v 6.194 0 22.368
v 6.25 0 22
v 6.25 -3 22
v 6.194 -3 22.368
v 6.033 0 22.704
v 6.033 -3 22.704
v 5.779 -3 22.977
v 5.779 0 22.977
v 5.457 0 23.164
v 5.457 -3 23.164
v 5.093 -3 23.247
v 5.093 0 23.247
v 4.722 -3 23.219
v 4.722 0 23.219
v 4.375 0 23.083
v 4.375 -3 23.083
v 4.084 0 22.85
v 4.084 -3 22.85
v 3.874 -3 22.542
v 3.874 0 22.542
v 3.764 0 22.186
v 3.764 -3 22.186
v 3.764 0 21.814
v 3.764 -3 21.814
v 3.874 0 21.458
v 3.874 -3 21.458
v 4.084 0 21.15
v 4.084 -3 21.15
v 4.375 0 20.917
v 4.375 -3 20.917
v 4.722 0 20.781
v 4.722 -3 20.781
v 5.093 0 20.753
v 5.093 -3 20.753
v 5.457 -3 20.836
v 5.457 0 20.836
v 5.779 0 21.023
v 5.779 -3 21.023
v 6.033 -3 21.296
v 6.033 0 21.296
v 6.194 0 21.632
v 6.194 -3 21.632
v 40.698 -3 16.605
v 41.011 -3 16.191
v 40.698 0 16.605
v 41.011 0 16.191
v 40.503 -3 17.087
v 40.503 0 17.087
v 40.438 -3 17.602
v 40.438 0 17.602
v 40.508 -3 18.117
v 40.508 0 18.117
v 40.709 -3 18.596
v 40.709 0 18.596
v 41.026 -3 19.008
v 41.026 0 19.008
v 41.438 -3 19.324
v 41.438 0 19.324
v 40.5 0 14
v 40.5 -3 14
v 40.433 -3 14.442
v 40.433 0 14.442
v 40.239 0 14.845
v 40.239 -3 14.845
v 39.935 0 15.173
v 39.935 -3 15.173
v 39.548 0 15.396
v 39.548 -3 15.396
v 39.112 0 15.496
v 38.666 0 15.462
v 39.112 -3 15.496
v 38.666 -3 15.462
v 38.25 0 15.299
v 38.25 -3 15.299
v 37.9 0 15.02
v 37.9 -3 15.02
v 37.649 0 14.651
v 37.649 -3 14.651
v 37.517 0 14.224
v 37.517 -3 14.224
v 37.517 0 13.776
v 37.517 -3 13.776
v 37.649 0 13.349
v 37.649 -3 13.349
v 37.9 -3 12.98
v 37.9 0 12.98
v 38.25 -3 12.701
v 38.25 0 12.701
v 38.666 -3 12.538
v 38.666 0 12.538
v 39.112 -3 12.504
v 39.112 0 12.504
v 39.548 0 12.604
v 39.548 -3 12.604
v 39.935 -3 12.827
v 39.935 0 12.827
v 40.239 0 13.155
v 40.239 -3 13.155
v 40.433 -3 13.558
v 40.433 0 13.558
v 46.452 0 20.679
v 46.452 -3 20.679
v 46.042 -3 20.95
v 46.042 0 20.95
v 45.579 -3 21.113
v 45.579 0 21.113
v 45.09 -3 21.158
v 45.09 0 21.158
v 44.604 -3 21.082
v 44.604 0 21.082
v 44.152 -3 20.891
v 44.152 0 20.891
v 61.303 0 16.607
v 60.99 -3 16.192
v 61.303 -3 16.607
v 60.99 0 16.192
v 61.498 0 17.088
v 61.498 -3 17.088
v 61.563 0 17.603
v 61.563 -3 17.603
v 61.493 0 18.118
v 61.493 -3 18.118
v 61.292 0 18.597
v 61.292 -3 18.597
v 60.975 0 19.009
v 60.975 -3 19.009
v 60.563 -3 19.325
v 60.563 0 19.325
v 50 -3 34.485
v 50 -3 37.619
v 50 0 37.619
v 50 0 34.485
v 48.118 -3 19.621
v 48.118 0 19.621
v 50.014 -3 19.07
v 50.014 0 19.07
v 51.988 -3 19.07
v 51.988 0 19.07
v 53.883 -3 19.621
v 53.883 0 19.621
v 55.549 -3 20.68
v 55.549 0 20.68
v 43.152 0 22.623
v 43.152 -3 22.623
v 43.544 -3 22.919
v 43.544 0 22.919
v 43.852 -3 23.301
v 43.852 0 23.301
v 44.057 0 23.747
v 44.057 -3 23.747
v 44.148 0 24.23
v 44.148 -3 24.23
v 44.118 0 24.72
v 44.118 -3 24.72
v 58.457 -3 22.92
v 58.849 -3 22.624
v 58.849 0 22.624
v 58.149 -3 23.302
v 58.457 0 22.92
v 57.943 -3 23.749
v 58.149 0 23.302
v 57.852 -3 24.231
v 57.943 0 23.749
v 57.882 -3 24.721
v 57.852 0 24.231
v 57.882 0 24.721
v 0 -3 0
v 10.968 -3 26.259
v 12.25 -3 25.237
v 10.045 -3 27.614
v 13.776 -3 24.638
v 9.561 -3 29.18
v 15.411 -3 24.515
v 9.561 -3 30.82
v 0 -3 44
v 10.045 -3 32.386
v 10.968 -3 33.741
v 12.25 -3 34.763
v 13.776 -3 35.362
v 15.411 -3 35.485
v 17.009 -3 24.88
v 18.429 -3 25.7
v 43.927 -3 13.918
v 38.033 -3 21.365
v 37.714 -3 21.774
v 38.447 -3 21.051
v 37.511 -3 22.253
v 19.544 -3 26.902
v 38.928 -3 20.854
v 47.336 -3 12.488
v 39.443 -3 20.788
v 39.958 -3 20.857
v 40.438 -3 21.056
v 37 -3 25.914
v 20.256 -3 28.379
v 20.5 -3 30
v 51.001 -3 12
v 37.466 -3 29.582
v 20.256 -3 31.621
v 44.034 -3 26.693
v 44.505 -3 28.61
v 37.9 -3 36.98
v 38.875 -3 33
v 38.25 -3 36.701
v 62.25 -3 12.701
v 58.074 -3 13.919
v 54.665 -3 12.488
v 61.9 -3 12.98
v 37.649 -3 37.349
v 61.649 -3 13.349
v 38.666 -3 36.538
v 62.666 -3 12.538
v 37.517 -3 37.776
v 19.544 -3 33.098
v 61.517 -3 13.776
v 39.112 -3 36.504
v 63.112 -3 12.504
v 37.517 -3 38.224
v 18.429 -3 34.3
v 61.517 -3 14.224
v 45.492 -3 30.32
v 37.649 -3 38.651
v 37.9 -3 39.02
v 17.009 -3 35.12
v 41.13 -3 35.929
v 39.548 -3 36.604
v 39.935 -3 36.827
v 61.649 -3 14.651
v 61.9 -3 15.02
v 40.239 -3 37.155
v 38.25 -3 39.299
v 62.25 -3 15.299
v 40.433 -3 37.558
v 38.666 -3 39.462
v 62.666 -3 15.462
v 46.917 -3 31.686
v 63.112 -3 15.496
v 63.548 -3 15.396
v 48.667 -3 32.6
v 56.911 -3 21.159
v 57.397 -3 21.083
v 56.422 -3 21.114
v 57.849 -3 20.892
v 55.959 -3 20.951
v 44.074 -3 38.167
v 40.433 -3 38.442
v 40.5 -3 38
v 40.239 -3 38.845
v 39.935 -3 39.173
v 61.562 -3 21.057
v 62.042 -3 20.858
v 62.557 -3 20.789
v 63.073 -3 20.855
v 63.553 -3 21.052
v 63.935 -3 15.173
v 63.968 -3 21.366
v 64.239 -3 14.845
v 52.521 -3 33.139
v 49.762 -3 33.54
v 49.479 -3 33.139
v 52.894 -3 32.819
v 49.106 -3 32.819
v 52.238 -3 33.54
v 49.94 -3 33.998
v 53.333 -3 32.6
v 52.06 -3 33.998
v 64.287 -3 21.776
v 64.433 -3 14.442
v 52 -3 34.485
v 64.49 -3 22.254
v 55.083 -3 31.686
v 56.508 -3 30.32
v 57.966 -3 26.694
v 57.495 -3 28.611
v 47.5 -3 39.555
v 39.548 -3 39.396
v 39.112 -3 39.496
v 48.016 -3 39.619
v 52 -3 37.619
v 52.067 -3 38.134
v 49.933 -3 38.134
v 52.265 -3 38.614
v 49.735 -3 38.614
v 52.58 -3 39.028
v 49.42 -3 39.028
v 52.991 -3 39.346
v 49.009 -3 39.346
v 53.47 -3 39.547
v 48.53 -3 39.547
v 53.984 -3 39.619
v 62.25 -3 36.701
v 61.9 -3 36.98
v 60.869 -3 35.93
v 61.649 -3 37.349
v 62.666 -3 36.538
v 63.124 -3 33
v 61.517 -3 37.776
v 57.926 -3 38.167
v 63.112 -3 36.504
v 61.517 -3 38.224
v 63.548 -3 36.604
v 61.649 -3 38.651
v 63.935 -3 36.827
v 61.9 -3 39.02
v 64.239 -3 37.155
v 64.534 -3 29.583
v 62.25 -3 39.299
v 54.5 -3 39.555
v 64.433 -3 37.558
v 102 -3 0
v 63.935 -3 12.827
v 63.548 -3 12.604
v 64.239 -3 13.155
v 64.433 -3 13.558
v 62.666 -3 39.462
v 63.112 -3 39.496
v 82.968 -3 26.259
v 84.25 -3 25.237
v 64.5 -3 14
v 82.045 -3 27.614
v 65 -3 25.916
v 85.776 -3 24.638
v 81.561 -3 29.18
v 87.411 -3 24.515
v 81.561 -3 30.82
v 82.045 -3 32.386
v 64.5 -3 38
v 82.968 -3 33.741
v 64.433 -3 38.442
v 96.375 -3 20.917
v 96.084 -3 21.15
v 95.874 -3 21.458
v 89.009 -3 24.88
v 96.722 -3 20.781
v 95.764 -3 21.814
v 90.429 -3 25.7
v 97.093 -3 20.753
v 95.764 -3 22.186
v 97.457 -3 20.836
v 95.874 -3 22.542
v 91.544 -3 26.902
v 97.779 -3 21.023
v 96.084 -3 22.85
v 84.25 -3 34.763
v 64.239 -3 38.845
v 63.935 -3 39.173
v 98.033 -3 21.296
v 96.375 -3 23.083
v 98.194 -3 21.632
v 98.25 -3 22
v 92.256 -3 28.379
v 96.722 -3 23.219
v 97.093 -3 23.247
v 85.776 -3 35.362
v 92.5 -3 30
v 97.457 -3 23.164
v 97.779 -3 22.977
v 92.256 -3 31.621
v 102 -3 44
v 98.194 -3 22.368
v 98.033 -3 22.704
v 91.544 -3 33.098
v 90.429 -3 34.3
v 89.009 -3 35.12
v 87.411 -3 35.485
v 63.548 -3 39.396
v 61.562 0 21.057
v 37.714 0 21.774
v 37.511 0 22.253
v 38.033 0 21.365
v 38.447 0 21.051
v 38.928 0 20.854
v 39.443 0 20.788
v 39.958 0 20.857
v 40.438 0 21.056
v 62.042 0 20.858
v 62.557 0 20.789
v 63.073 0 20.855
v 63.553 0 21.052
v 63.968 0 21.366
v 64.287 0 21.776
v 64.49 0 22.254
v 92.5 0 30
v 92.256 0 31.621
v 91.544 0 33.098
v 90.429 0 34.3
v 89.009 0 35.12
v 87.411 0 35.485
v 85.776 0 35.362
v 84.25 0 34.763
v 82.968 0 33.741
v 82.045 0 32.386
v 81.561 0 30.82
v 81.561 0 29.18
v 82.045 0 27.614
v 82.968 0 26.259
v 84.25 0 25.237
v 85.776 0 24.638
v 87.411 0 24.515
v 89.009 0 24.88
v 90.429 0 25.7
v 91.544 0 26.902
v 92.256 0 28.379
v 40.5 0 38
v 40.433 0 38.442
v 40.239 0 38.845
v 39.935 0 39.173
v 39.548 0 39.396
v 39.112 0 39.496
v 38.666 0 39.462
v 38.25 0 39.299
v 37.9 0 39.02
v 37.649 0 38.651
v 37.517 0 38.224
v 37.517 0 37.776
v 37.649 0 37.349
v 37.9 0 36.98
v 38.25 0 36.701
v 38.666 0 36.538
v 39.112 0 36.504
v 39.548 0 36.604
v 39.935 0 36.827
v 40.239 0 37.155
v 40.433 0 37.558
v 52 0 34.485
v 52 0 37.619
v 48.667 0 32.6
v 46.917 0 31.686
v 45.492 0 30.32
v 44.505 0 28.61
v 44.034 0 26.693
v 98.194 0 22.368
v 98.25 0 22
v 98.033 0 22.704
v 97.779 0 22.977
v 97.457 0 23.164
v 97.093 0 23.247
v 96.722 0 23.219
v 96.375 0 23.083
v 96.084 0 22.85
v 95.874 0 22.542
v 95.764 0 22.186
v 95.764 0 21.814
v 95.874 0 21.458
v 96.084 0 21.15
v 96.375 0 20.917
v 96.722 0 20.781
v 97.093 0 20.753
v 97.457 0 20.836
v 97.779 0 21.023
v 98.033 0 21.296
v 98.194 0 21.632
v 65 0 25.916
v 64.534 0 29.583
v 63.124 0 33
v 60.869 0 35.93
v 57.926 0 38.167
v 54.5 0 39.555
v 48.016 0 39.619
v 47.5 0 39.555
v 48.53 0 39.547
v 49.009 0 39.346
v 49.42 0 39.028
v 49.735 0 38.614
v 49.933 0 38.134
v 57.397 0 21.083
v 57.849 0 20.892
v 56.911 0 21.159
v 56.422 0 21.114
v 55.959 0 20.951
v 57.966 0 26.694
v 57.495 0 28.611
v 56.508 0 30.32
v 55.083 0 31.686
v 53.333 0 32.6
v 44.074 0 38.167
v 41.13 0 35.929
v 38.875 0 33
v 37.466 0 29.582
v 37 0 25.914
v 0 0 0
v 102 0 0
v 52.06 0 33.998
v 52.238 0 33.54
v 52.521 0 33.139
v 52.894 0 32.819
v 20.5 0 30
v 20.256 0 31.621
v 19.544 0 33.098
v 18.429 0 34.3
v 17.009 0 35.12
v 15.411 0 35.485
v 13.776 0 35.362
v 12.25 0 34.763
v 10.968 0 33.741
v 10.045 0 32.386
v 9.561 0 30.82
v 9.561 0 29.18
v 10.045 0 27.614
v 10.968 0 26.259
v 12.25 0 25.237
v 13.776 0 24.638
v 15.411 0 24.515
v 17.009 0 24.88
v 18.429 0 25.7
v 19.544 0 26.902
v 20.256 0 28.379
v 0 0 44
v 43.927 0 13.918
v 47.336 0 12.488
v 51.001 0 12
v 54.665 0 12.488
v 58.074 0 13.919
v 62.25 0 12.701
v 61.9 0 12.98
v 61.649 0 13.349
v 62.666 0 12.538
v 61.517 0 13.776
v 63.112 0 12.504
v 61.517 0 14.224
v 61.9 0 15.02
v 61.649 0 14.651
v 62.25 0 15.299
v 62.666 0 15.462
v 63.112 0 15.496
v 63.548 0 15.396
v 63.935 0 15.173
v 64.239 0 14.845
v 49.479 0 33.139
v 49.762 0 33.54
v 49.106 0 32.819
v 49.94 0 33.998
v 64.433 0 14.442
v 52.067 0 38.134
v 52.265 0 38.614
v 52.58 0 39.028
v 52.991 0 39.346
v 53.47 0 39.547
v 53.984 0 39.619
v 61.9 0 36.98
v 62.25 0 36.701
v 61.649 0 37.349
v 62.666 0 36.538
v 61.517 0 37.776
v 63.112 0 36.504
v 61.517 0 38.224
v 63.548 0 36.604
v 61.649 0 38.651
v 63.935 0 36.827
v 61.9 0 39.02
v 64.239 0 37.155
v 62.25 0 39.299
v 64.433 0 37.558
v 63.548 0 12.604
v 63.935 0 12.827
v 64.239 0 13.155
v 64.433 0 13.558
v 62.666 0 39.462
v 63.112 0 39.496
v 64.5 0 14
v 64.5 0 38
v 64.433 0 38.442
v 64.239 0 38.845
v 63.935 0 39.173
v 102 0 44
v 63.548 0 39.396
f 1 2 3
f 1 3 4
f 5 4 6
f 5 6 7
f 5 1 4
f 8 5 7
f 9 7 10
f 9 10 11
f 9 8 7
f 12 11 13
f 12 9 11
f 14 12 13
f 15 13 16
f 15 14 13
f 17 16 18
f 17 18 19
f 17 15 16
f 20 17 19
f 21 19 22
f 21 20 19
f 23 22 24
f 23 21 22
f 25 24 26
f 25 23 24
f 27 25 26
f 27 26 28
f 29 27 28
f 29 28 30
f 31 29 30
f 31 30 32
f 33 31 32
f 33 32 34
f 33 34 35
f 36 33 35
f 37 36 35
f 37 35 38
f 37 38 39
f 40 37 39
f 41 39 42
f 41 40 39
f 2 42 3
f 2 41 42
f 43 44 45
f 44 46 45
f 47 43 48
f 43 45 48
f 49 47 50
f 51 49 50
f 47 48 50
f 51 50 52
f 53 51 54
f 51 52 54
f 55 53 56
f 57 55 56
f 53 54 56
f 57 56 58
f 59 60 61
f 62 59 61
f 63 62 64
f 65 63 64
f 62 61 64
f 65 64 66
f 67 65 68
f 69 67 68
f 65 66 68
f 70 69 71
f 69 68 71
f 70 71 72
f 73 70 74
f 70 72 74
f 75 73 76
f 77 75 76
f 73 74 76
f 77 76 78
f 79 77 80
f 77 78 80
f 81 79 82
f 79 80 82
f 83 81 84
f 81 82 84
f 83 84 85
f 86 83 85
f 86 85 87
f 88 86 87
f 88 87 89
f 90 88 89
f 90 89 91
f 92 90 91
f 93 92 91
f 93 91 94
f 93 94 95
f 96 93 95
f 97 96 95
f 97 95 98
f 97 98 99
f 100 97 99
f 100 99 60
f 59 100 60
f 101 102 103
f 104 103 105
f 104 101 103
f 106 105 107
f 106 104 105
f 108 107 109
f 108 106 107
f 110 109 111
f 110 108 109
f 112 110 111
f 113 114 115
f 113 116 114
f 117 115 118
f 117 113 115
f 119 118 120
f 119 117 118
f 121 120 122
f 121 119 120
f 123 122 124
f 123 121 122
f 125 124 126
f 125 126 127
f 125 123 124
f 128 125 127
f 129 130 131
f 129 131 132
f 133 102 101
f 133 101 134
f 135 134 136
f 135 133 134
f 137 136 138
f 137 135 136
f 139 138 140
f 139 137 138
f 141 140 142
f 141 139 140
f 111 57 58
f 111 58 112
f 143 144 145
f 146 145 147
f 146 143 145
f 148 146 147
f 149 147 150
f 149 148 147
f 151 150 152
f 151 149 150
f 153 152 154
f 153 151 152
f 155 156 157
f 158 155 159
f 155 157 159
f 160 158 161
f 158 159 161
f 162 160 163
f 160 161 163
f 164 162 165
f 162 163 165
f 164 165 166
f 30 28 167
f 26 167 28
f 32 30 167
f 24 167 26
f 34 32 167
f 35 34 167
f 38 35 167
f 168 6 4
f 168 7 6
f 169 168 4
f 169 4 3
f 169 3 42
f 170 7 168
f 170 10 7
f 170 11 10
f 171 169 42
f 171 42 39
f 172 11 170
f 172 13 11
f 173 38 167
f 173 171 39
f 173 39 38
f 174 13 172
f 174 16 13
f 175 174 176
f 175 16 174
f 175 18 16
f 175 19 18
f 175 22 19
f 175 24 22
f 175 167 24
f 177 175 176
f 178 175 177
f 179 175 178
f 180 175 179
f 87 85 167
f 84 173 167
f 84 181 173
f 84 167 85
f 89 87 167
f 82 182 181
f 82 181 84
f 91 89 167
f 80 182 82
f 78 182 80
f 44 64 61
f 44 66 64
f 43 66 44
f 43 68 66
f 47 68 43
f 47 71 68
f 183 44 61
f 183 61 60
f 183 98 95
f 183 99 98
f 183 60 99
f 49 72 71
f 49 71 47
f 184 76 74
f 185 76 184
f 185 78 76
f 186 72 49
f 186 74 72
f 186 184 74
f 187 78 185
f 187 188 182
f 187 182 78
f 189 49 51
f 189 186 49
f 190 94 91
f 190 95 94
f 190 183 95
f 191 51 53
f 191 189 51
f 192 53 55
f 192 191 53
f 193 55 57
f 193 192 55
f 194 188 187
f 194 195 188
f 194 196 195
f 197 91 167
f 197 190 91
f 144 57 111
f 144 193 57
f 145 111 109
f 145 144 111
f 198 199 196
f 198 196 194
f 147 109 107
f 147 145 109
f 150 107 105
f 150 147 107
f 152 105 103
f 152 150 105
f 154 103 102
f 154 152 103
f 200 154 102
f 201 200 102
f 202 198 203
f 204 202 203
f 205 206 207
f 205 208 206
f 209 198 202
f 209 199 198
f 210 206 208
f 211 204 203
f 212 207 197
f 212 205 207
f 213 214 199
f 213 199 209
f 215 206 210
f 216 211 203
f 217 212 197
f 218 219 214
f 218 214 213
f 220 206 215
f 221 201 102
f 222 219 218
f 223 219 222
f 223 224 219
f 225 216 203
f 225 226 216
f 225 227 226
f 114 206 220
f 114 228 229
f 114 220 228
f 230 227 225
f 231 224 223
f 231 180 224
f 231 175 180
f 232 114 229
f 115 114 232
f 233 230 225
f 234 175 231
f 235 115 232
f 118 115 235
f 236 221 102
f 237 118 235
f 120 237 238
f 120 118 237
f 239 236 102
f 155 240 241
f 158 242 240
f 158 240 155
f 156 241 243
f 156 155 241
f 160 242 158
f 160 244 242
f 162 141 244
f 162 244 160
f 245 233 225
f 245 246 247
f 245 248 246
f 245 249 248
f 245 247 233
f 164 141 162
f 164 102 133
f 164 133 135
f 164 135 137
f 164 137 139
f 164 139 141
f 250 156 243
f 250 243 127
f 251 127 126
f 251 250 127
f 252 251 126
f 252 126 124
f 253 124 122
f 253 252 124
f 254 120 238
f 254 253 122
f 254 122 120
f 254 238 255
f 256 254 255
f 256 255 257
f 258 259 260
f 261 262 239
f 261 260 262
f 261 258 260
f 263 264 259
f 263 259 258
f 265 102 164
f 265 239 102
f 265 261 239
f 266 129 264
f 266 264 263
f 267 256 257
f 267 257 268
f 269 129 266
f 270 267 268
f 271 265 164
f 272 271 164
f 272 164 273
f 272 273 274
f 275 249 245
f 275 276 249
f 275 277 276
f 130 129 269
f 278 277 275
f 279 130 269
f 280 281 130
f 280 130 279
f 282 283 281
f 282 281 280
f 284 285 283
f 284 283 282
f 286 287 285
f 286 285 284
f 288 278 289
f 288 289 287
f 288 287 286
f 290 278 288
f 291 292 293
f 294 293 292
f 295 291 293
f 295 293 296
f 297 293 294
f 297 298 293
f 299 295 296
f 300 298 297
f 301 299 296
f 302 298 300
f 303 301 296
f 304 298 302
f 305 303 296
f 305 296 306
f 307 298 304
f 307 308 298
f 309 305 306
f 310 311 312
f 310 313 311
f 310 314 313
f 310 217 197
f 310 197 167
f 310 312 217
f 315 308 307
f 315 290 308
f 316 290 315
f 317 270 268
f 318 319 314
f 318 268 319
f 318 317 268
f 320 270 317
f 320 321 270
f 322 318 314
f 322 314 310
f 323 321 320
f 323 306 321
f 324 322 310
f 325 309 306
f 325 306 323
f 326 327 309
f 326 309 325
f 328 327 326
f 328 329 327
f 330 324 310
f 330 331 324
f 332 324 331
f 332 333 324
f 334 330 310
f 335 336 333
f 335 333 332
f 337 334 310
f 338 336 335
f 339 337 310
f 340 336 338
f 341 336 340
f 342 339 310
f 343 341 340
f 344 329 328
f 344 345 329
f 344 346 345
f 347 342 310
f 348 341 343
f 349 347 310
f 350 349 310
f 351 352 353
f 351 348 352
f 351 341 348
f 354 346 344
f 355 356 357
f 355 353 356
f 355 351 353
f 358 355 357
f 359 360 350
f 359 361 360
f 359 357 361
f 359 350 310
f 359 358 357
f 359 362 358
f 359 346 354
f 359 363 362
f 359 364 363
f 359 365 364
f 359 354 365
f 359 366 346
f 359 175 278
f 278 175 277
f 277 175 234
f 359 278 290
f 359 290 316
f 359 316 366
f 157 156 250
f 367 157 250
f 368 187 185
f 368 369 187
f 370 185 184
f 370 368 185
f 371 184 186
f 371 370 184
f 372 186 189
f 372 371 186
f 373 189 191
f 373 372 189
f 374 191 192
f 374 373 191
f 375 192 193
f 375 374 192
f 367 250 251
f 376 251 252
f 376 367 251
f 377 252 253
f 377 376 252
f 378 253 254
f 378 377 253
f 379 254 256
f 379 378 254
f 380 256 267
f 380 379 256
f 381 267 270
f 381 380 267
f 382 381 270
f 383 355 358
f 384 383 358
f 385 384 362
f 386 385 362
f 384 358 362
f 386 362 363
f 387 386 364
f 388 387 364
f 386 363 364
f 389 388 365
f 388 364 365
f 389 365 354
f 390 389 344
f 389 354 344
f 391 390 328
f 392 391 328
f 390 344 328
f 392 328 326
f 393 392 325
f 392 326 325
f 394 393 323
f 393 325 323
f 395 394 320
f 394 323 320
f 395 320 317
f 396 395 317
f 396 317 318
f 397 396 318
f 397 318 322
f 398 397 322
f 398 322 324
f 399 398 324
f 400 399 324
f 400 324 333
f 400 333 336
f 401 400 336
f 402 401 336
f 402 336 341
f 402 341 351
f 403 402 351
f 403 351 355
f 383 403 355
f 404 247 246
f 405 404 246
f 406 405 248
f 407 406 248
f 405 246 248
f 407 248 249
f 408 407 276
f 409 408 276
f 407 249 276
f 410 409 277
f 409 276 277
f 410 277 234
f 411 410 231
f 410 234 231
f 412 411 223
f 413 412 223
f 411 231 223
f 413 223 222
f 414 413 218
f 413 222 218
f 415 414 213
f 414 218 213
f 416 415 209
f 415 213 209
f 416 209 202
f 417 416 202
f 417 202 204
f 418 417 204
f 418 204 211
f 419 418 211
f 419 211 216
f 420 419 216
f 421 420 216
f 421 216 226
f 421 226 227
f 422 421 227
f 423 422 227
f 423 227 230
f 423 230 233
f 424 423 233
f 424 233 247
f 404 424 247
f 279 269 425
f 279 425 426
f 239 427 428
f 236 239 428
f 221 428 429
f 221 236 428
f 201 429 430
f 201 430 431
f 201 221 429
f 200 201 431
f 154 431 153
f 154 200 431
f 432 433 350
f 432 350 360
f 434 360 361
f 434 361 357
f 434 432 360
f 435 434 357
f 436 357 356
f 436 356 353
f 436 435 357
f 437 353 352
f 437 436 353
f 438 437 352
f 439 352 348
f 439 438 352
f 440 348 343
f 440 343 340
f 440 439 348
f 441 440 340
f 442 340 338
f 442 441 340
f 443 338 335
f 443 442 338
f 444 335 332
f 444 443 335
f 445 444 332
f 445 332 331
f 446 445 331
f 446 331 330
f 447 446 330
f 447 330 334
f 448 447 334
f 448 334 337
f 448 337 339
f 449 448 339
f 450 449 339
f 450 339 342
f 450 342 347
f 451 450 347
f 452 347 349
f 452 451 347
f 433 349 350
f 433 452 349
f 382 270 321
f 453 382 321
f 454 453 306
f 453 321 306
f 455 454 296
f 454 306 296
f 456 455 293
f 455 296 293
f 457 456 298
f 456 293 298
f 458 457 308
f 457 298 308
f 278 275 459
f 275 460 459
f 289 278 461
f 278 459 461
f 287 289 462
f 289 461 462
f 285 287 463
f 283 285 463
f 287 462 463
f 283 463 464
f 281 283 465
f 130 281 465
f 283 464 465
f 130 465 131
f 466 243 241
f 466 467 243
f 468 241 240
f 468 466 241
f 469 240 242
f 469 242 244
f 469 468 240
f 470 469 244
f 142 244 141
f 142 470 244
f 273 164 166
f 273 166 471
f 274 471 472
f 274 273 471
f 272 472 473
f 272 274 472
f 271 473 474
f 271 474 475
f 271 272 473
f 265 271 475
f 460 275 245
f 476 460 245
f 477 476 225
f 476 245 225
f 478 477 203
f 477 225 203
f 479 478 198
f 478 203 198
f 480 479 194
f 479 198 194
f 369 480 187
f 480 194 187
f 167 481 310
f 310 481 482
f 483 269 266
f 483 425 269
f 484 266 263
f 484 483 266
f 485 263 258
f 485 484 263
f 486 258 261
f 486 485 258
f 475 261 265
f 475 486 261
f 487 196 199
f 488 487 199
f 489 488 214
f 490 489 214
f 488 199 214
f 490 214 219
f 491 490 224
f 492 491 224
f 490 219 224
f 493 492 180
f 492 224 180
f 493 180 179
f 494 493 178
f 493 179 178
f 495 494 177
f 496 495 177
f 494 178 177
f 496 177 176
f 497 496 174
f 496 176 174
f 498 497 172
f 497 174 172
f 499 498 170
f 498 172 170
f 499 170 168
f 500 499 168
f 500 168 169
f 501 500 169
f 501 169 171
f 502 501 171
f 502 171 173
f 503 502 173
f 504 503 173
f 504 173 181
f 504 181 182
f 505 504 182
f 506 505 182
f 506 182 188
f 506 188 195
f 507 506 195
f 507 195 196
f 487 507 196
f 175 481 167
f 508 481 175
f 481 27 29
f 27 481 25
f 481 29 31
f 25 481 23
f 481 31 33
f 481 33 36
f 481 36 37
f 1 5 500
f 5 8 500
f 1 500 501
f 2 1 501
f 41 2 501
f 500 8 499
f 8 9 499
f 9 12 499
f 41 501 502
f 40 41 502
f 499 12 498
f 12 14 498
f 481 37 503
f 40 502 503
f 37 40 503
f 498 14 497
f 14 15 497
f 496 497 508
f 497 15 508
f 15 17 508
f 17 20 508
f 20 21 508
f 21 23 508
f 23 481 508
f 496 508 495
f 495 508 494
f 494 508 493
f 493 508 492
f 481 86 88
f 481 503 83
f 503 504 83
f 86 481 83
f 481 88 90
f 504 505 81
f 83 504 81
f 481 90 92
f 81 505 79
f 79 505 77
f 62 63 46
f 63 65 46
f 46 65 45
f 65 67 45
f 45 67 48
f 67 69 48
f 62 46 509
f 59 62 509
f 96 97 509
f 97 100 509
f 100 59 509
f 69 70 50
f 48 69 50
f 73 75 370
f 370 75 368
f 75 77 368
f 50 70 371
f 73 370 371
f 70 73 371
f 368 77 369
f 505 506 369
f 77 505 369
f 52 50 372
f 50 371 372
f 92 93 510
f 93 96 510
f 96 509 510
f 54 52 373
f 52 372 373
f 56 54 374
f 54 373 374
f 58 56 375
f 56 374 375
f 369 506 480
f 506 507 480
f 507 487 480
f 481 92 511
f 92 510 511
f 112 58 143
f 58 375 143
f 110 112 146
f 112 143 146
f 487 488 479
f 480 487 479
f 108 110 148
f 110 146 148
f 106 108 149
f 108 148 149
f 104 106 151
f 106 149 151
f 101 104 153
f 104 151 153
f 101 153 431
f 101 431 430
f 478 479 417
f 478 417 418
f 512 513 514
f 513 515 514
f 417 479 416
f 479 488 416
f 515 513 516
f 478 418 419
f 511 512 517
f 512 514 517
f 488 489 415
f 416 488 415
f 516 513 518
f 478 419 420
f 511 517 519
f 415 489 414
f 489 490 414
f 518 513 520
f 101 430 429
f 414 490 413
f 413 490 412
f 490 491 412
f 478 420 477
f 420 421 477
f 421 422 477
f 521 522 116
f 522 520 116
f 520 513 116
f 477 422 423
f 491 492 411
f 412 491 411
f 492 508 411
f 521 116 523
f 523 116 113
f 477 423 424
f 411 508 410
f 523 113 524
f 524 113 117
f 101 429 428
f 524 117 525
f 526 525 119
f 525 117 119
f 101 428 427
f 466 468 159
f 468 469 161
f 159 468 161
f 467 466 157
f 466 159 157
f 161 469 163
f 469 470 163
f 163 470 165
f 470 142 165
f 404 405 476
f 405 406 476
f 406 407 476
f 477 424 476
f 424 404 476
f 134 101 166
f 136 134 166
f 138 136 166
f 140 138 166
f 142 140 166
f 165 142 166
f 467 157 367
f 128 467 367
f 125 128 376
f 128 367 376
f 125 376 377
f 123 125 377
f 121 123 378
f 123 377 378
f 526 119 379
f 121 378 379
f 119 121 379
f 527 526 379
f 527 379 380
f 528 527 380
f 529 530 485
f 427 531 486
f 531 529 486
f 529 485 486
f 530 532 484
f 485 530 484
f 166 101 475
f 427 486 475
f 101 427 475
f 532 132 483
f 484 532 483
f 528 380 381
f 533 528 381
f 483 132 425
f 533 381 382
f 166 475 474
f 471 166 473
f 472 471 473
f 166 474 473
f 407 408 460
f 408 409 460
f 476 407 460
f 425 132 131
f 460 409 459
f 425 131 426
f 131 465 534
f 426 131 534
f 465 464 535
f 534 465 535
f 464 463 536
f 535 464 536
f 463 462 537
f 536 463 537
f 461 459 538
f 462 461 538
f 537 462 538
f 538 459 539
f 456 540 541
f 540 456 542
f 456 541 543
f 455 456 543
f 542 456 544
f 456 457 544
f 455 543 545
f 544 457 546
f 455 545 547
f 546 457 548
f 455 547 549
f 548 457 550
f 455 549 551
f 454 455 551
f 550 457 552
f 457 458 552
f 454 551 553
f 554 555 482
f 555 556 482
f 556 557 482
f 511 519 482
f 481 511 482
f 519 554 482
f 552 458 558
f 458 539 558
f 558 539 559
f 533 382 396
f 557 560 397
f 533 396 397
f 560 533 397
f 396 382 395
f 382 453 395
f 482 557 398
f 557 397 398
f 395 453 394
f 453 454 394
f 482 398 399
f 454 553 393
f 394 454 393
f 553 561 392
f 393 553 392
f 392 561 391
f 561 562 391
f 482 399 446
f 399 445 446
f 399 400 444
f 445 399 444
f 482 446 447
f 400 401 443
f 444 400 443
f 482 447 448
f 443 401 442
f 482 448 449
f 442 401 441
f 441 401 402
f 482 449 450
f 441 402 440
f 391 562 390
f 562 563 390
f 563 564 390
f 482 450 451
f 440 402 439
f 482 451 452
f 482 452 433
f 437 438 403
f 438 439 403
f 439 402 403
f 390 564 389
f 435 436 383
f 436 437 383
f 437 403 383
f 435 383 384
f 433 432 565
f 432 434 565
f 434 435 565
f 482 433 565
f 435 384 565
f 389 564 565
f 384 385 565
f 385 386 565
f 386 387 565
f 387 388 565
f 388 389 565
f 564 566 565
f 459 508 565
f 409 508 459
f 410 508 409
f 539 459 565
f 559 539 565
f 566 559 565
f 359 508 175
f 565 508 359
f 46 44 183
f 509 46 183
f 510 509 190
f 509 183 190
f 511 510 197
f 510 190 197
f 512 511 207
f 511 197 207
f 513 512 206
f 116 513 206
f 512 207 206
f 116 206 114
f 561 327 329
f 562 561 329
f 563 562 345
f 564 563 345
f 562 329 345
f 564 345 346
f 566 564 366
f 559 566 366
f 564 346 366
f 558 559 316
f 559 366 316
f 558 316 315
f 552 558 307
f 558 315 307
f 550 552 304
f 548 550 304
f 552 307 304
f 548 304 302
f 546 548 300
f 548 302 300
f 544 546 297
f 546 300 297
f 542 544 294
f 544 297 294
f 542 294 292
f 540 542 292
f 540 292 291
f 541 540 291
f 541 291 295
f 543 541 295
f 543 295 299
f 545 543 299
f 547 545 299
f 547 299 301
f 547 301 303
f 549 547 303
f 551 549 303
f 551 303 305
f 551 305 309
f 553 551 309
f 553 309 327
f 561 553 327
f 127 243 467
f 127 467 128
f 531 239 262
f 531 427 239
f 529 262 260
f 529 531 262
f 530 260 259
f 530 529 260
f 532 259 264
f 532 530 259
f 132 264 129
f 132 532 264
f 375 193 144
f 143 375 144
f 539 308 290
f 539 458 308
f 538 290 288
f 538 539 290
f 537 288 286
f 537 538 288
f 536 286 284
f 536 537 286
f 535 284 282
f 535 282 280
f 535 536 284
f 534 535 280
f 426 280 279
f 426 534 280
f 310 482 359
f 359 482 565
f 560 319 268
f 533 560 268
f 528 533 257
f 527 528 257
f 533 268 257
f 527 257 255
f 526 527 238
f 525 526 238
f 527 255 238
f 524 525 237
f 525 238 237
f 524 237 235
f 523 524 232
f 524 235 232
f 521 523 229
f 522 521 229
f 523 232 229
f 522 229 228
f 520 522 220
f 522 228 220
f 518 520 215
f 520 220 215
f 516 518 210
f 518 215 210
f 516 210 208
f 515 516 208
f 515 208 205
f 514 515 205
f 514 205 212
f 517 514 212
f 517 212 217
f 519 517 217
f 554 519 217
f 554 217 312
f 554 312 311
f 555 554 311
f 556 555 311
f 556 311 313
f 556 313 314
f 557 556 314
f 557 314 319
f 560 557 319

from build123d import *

# Parameters (mm, degrees)
SKETCH_W        = 102
SKETCH_H        = 44
SKETCH_R        = 1.25
PAD_DEPTH       = 3
SKETCH001_R     = 5.5
POCKET_DEPTH    = 3.001
SKETCH002_R     = 1.5
POCKET001_DEPTH = 3.001
POCKET002_DEPTH = 3.001
FILLET_R        = 2


with BuildPart() as part:
    # Sketch → Pad (new body)
    with BuildSketch(Plane.XZ):
        with Locations((51, 22)):
            Rectangle(SKETCH_W, SKETCH_H)
        with Locations((5, 22)):
            Circle(SKETCH_R, mode=Mode.SUBTRACT)
        with Locations((97, 22)):
            Circle(SKETCH_R, mode=Mode.SUBTRACT)
    extrude(amount=PAD_DEPTH)

    # Sketch001 (on Face8 of Pad) → Pocket (cut, through all)
    with BuildSketch(Plane.XZ.offset(3)):
        with Locations((15, 30)):
            Circle(SKETCH001_R)
        with Locations((87, 30)):
            Circle(SKETCH001_R)
    extrude(amount=-POCKET_DEPTH, mode=Mode.SUBTRACT)

    # Sketch002 (on Face5 of Pocket) → Pocket001 (cut, through all)
    with BuildSketch(Plane.XZ.offset(3)):
        with Locations((39, 38)):
            Circle(SKETCH002_R)
        with Locations((63, 38)):
            Circle(SKETCH002_R)
        with Locations((39, 14)):
            Circle(SKETCH002_R)
        with Locations((63, 14)):
            Circle(SKETCH002_R)
    extrude(amount=-POCKET001_DEPTH, mode=Mode.SUBTRACT)

    # Sketch003 (on Face5 of Pocket001) → Pocket002 (cut, through all)
    with BuildSketch(Plane.XZ.offset(3)):
        with BuildLine():
            Line((50, 39.96424), (50, 32.928203))
            ThreePointArc((50, 32.928203), (44.937661, 29.499721), (44.500239, 23.401325))
            Line((38.406893, 19.88333), (44.500239, 23.401325))
            ThreePointArc((50, 39.96424), (38.875484, 32.999723), (38.406893, 19.88333))
        make_face()
        with BuildLine():
            Line((39.406972, 18.151325), (45.500399, 21.669367))
            ThreePointArc((45.500399, 21.669367), (51.000645, 19), (56.500399, 21.670379))
            Line((56.500399, 21.670379), (62.593745, 18.152384))
            ThreePointArc((39.406972, 18.151325), (51.00064, 12), (62.593745, 18.152384))
        make_face()
        with BuildLine():
            Line((57.500239, 23.402522), (63.593666, 19.884481))
            ThreePointArc((63.593666, 19.884481), (63.124196, 33.000277), (52, 39.96424))
            Line((52, 32.928203), (52, 39.96424))
            ThreePointArc((57.500239, 23.402522), (57.062017, 29.500279), (52, 32.928203))
        make_face()
    extrude(amount=-POCKET002_DEPTH, mode=Mode.SUBTRACT)

    # Fillet
    fillet_edges = [part.edges().sort_by_distance(p)[0] for p in [
        (44.500239, -1.5, 23.401325),
        (50, -1.5, 32.928203),
        (63.593666, -1.5, 19.884481),
        (56.500399, -1.5, 21.670379),
        (52, -1.5, 39.96424),
        (39.406972, -1.5, 18.151325),
        (62.593745, -1.5, 18.152384),
        (45.500399, -1.5, 21.669367),
        (50, -1.5, 39.96424),
        (38.406893, -1.5, 19.88333),
        (52, -1.5, 32.928203),
        (57.500239, -1.5, 23.402522),
    ]]
    fillet(fillet_edges, radius=FILLET_R)


solid = part.part
